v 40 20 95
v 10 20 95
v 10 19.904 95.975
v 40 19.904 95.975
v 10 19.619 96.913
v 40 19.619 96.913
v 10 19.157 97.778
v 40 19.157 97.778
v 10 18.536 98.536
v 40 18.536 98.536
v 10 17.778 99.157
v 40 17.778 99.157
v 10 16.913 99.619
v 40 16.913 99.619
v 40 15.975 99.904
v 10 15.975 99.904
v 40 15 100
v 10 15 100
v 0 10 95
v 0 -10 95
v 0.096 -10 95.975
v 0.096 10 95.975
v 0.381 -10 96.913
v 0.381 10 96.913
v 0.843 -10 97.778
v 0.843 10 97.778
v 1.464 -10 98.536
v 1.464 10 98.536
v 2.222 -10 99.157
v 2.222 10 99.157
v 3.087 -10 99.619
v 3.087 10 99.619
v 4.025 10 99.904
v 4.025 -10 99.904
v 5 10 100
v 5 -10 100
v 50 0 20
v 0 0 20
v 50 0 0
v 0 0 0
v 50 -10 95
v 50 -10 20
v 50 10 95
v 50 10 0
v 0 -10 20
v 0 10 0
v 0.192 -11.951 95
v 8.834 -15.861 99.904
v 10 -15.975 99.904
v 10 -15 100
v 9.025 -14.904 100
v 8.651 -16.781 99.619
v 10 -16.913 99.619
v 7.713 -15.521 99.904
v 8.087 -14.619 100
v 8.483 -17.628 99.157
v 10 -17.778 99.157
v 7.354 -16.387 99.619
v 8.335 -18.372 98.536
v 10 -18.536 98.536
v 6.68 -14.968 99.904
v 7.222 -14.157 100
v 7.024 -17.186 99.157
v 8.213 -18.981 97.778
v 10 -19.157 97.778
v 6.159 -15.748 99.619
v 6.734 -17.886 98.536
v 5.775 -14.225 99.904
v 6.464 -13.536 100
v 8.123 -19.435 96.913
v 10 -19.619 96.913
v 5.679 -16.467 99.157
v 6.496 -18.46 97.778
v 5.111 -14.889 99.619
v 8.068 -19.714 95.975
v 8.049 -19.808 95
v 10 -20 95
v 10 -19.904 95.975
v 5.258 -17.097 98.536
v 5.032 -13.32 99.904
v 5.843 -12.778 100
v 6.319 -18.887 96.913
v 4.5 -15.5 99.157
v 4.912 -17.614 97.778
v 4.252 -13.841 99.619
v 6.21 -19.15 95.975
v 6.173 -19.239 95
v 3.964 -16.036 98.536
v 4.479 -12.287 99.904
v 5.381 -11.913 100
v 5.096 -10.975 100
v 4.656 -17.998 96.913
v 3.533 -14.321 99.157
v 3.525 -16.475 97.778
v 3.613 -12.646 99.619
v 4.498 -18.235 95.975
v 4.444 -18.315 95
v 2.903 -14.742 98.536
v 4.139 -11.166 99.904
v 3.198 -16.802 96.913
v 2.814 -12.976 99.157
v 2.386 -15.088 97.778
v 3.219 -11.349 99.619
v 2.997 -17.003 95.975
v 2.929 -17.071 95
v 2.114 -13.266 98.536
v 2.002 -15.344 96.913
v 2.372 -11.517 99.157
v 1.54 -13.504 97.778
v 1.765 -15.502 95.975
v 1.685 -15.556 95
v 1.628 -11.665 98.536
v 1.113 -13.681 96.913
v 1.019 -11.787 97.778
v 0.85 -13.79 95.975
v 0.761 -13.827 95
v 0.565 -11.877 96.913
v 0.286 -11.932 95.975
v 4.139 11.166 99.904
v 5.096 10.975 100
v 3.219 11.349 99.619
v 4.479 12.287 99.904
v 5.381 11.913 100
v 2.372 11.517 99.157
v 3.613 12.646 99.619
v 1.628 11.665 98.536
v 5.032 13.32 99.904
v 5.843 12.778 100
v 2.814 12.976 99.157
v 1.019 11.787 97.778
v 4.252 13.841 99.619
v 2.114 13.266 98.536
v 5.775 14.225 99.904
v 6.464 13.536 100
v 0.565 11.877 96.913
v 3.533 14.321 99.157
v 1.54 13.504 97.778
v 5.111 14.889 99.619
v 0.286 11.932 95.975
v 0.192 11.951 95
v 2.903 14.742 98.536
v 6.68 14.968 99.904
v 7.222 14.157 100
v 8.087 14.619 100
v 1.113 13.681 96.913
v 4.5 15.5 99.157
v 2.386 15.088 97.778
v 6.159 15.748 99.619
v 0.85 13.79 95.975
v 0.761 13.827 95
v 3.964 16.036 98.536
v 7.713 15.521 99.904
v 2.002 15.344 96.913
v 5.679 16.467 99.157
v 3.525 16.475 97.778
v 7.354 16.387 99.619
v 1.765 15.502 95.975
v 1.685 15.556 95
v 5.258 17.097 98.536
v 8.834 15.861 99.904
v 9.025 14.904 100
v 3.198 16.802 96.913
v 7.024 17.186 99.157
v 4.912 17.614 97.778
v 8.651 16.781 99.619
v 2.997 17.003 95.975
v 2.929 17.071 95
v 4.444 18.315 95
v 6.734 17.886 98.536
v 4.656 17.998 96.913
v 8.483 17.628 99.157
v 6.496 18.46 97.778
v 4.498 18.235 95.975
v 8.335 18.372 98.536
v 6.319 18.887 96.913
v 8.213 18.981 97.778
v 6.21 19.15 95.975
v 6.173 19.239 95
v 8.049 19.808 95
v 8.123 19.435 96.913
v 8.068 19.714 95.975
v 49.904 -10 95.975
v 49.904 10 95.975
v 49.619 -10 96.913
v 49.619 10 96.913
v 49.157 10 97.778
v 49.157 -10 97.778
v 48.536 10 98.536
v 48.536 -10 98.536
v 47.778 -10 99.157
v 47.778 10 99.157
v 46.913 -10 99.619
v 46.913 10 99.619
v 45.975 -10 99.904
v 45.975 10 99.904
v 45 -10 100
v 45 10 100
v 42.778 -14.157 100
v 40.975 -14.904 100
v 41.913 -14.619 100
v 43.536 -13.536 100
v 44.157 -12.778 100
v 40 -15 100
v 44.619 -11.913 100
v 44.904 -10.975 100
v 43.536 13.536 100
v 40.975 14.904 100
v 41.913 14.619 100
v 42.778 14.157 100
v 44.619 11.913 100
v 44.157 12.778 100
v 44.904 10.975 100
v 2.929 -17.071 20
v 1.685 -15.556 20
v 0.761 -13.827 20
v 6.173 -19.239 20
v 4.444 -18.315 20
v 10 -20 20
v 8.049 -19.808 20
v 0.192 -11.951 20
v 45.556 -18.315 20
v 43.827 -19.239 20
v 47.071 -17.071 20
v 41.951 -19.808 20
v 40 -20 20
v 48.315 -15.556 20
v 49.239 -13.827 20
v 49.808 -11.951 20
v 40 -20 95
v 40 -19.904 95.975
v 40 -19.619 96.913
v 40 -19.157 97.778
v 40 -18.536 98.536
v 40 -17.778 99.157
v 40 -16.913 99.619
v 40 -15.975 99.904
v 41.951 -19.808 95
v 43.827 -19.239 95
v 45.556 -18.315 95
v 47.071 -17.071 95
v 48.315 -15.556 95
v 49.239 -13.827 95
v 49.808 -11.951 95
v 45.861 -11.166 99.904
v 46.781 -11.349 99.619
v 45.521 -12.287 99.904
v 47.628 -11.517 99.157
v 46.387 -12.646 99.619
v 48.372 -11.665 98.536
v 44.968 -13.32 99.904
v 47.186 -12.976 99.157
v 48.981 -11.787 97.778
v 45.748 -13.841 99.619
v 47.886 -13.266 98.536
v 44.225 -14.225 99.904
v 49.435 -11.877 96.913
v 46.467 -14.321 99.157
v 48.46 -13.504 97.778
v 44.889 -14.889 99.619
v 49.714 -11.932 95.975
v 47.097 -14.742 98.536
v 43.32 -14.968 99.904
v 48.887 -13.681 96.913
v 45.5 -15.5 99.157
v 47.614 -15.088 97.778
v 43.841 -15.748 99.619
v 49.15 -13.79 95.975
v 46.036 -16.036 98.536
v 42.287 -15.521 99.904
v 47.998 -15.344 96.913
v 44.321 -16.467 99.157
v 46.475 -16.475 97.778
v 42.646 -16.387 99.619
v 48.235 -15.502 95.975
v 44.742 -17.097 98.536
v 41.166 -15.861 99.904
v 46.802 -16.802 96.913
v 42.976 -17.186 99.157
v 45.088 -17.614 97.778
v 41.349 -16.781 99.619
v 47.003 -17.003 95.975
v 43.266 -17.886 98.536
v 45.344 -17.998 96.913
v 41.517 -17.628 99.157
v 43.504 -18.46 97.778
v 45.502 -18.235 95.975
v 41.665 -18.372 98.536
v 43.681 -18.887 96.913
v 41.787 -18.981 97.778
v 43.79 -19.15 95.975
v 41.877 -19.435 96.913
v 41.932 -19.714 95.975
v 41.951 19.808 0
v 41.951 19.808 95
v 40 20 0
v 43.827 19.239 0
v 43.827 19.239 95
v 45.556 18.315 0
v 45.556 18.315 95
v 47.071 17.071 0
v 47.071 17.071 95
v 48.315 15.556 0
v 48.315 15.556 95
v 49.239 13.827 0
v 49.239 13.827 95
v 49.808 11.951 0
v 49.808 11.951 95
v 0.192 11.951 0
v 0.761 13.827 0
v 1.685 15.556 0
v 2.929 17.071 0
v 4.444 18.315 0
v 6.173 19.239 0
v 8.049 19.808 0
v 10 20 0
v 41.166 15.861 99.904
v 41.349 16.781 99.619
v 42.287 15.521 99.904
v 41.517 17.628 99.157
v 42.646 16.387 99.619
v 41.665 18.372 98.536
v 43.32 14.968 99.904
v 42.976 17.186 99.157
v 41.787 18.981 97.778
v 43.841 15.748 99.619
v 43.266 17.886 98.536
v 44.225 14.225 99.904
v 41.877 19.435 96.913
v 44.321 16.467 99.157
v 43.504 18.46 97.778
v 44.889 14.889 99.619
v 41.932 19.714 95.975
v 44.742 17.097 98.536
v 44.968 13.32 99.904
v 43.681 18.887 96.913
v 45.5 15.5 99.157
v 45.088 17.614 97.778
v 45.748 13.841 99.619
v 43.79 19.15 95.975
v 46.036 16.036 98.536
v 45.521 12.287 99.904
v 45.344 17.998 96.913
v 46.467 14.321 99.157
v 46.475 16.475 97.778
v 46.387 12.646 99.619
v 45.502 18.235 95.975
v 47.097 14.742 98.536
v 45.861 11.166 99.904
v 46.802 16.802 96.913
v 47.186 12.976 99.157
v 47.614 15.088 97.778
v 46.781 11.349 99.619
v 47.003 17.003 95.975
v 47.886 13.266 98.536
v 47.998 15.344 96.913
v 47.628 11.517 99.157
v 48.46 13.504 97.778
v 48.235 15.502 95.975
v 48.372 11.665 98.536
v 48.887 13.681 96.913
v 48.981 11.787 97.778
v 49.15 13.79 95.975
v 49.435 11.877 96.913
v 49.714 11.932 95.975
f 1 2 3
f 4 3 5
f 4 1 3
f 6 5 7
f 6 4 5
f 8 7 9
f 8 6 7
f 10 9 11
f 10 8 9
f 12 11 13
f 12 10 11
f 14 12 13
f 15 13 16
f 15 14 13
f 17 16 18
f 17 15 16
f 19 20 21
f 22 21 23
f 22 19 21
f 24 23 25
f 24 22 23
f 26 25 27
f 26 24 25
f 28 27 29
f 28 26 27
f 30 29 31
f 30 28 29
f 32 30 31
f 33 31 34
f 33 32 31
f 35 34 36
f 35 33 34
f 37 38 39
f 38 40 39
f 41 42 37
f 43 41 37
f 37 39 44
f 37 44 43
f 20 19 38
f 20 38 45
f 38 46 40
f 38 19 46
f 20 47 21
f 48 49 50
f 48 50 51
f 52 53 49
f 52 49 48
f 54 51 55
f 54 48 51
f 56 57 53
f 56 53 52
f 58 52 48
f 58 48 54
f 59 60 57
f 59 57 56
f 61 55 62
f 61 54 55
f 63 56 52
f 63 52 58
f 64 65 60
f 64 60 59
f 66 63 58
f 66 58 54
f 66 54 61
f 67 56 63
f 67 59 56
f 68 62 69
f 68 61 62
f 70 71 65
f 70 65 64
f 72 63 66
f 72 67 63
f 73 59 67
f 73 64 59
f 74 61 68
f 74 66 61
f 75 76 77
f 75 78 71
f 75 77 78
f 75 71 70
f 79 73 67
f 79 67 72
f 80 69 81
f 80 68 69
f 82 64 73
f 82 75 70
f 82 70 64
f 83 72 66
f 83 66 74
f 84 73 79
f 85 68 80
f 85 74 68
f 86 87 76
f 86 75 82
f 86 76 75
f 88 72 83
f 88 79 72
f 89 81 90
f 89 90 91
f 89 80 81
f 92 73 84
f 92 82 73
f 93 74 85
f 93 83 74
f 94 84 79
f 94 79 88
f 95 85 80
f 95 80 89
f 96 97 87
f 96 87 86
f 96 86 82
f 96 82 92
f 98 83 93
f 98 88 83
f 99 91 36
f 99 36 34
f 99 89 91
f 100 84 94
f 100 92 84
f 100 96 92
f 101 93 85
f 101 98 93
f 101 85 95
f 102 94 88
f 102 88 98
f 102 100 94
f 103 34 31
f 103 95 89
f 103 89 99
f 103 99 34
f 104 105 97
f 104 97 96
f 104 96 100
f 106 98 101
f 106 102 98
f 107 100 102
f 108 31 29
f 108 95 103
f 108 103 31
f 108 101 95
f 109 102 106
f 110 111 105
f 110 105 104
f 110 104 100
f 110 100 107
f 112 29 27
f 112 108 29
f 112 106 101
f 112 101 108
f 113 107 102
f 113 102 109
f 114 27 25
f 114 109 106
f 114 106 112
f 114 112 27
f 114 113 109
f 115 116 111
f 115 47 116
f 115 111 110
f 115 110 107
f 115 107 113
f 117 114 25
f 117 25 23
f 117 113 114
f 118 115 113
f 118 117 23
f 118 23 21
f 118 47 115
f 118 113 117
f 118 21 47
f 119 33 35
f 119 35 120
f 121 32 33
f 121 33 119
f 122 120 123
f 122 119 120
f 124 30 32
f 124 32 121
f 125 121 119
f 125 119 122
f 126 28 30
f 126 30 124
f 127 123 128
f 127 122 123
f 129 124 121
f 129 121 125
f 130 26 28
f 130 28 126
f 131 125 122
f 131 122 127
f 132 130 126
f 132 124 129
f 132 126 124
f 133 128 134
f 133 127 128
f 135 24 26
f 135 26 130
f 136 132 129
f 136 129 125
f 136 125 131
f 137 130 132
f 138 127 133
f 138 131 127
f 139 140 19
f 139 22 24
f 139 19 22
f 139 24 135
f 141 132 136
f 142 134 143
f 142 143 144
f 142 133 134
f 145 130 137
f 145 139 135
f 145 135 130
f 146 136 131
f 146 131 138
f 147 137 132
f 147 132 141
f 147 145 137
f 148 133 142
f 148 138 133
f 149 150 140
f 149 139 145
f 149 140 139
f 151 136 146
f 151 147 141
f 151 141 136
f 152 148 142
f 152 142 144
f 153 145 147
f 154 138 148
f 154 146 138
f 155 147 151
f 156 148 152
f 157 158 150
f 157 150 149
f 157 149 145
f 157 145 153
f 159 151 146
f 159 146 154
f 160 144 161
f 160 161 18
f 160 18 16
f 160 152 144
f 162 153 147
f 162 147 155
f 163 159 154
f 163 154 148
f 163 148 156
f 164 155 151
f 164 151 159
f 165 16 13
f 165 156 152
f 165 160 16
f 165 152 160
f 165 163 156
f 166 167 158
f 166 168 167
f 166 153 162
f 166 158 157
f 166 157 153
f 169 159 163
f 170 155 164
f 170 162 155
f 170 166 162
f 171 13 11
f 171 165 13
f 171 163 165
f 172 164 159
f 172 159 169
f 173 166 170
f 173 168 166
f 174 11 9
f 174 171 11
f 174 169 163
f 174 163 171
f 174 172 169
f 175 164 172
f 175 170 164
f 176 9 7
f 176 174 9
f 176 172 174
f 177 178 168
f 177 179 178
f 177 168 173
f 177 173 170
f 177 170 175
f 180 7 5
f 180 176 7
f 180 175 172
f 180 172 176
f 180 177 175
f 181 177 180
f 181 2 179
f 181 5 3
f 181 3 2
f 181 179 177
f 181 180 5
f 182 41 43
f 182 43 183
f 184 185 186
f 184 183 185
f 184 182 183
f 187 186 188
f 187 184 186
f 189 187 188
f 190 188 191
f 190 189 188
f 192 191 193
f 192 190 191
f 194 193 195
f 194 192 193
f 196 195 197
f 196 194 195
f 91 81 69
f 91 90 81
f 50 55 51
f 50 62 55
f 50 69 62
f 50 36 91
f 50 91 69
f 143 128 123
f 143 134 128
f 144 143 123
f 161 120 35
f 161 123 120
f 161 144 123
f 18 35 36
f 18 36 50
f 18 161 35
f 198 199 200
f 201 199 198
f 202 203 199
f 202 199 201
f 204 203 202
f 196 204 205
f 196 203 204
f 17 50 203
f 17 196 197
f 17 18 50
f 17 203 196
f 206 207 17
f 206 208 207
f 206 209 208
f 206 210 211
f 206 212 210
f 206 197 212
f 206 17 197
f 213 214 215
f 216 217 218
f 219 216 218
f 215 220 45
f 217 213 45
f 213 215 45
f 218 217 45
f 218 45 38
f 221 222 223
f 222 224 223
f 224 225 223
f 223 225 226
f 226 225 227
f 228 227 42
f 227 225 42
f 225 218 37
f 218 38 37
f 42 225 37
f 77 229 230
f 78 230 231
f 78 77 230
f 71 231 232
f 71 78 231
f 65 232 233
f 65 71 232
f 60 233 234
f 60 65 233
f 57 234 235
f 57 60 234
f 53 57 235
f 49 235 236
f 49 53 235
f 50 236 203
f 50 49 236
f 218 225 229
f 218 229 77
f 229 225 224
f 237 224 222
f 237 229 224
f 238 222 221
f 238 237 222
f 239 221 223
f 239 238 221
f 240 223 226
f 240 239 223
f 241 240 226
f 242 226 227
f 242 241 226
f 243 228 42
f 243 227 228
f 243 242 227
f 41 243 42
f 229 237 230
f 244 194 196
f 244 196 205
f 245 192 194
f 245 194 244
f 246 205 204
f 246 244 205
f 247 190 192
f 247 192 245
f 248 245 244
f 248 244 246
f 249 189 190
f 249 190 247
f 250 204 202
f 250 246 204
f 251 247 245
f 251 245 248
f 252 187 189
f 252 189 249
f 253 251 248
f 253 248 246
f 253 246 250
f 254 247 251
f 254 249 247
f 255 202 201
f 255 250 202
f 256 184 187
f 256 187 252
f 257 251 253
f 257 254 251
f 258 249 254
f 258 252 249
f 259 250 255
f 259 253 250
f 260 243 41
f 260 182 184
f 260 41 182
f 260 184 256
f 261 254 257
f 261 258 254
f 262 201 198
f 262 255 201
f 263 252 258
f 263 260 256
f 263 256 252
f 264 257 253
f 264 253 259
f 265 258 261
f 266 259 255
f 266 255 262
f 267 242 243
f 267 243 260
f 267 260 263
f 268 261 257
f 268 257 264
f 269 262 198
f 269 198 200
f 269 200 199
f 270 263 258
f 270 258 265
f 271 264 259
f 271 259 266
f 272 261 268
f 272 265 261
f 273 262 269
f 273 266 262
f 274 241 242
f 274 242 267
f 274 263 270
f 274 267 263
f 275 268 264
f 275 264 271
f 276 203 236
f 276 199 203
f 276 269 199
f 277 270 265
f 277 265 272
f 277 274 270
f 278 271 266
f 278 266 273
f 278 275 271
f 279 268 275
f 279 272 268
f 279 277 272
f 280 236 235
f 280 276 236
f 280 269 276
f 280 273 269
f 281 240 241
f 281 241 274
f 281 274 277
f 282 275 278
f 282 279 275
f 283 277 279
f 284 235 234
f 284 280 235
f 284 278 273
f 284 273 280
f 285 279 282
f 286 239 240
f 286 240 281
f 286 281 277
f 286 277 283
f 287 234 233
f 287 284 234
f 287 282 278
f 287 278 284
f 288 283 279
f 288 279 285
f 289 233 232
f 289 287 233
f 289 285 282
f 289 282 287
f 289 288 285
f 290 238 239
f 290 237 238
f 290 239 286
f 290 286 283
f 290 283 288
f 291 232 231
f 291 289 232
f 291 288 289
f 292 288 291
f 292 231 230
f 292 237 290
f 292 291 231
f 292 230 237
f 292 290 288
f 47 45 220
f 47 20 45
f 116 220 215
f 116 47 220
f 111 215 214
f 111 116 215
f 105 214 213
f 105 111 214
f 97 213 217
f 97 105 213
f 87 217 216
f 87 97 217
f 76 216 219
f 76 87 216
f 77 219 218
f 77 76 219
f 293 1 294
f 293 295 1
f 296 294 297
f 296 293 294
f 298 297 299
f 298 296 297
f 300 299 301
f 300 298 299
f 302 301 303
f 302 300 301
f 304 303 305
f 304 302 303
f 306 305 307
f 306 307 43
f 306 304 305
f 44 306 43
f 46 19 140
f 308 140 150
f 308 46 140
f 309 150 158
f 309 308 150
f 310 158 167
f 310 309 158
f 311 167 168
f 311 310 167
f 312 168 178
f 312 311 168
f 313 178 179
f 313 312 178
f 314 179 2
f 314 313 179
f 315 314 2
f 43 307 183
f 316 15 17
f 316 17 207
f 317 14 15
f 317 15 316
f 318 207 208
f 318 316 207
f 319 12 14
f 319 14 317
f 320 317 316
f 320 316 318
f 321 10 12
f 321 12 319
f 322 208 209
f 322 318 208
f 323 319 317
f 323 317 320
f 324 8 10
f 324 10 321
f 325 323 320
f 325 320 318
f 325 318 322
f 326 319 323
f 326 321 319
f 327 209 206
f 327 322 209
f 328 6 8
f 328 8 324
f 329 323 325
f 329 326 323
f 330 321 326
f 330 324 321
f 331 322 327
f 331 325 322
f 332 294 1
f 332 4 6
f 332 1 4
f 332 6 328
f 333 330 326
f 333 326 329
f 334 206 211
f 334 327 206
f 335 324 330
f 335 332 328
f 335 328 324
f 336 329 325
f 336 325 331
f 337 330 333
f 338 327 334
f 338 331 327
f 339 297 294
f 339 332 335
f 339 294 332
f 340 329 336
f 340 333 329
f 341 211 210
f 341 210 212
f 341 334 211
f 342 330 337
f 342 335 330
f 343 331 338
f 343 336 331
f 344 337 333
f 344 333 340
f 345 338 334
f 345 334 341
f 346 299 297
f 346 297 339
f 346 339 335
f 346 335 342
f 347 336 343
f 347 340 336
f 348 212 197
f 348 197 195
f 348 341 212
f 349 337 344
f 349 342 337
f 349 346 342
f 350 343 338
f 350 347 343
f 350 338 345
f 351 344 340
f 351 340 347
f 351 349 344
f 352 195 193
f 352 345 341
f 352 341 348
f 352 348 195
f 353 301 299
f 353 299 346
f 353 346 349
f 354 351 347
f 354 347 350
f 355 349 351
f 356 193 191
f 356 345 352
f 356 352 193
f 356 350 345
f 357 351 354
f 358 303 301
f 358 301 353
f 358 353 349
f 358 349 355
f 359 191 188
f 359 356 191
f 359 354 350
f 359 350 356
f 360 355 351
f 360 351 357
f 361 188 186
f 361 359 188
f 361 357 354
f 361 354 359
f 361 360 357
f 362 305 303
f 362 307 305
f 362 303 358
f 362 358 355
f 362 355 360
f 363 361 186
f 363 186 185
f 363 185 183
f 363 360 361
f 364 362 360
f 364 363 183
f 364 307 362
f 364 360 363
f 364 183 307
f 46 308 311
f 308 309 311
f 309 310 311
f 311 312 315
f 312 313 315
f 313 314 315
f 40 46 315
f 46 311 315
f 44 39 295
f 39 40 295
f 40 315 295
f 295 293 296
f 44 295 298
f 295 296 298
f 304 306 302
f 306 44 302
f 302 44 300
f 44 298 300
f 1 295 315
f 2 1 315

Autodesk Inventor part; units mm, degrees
ref_plane "YZ Plane" through (0, 0, 0) normal (1, 0, 0) x (0, 1, 0)
ref_plane "XZ Plane" through (0, 0, 0) normal (0, 1, 0) x (-1, 0, 0)
ref_plane "XY Plane" through (0, 0, 0) normal (0, 0, 1) x (1, 0, 0)
sketch "Sketch1" plane through (0, 0, 0) normal (0, 0, 1) x (1, 0, 0)
  line L0 (0, 0) -> (50, 0)
  line L1 (50, 0) -> (50, 20)
  line L2 (50, 20) -> (0, 20)
  line L3 (0, 20) -> (0, 0)
  dimension "d0" = 20
  dimension "d1" = 50
extrude "Extrusion1" add sketch "Sketch1" along normal blind 20
sketch "Sketch2" plane through (0, 0, 20) normal (0, 0, 1) x (1, 0, 0)
  line L0 (50, 20) -> (0, 20) projected
  line L1 (0, 20) -> (50, 20)
  line L2 (50, 20) -> (50, -20)
  line L3 (50, -20) -> (0, -20)
  line L4 (0, -20) -> (0, 20)
  point P0 (0, 0)
  dimension "d4" = 50
  dimension "d5" = 40
extrude "Extrusion2" add sketch "Sketch2" along normal blind 80
fillet "Fillet1" radius 10 4 edges at (50, 20, 50) (0, 20, 50) (50, -20, 60) (0, -20, 60)
fillet "Fillet2" radius 5 8 edges at (50, 0, 100) (47.0711, -17.0711, 100) (25, -20, 100) (2.9289, -17.0711, 100) (0, 0, 100) (2.9289, 17.0711, 100) (25, 20, 100) (47.0711, 17.0711, 100)
properties part number "Throttle Handler" material "Acetal Resin, Black"
